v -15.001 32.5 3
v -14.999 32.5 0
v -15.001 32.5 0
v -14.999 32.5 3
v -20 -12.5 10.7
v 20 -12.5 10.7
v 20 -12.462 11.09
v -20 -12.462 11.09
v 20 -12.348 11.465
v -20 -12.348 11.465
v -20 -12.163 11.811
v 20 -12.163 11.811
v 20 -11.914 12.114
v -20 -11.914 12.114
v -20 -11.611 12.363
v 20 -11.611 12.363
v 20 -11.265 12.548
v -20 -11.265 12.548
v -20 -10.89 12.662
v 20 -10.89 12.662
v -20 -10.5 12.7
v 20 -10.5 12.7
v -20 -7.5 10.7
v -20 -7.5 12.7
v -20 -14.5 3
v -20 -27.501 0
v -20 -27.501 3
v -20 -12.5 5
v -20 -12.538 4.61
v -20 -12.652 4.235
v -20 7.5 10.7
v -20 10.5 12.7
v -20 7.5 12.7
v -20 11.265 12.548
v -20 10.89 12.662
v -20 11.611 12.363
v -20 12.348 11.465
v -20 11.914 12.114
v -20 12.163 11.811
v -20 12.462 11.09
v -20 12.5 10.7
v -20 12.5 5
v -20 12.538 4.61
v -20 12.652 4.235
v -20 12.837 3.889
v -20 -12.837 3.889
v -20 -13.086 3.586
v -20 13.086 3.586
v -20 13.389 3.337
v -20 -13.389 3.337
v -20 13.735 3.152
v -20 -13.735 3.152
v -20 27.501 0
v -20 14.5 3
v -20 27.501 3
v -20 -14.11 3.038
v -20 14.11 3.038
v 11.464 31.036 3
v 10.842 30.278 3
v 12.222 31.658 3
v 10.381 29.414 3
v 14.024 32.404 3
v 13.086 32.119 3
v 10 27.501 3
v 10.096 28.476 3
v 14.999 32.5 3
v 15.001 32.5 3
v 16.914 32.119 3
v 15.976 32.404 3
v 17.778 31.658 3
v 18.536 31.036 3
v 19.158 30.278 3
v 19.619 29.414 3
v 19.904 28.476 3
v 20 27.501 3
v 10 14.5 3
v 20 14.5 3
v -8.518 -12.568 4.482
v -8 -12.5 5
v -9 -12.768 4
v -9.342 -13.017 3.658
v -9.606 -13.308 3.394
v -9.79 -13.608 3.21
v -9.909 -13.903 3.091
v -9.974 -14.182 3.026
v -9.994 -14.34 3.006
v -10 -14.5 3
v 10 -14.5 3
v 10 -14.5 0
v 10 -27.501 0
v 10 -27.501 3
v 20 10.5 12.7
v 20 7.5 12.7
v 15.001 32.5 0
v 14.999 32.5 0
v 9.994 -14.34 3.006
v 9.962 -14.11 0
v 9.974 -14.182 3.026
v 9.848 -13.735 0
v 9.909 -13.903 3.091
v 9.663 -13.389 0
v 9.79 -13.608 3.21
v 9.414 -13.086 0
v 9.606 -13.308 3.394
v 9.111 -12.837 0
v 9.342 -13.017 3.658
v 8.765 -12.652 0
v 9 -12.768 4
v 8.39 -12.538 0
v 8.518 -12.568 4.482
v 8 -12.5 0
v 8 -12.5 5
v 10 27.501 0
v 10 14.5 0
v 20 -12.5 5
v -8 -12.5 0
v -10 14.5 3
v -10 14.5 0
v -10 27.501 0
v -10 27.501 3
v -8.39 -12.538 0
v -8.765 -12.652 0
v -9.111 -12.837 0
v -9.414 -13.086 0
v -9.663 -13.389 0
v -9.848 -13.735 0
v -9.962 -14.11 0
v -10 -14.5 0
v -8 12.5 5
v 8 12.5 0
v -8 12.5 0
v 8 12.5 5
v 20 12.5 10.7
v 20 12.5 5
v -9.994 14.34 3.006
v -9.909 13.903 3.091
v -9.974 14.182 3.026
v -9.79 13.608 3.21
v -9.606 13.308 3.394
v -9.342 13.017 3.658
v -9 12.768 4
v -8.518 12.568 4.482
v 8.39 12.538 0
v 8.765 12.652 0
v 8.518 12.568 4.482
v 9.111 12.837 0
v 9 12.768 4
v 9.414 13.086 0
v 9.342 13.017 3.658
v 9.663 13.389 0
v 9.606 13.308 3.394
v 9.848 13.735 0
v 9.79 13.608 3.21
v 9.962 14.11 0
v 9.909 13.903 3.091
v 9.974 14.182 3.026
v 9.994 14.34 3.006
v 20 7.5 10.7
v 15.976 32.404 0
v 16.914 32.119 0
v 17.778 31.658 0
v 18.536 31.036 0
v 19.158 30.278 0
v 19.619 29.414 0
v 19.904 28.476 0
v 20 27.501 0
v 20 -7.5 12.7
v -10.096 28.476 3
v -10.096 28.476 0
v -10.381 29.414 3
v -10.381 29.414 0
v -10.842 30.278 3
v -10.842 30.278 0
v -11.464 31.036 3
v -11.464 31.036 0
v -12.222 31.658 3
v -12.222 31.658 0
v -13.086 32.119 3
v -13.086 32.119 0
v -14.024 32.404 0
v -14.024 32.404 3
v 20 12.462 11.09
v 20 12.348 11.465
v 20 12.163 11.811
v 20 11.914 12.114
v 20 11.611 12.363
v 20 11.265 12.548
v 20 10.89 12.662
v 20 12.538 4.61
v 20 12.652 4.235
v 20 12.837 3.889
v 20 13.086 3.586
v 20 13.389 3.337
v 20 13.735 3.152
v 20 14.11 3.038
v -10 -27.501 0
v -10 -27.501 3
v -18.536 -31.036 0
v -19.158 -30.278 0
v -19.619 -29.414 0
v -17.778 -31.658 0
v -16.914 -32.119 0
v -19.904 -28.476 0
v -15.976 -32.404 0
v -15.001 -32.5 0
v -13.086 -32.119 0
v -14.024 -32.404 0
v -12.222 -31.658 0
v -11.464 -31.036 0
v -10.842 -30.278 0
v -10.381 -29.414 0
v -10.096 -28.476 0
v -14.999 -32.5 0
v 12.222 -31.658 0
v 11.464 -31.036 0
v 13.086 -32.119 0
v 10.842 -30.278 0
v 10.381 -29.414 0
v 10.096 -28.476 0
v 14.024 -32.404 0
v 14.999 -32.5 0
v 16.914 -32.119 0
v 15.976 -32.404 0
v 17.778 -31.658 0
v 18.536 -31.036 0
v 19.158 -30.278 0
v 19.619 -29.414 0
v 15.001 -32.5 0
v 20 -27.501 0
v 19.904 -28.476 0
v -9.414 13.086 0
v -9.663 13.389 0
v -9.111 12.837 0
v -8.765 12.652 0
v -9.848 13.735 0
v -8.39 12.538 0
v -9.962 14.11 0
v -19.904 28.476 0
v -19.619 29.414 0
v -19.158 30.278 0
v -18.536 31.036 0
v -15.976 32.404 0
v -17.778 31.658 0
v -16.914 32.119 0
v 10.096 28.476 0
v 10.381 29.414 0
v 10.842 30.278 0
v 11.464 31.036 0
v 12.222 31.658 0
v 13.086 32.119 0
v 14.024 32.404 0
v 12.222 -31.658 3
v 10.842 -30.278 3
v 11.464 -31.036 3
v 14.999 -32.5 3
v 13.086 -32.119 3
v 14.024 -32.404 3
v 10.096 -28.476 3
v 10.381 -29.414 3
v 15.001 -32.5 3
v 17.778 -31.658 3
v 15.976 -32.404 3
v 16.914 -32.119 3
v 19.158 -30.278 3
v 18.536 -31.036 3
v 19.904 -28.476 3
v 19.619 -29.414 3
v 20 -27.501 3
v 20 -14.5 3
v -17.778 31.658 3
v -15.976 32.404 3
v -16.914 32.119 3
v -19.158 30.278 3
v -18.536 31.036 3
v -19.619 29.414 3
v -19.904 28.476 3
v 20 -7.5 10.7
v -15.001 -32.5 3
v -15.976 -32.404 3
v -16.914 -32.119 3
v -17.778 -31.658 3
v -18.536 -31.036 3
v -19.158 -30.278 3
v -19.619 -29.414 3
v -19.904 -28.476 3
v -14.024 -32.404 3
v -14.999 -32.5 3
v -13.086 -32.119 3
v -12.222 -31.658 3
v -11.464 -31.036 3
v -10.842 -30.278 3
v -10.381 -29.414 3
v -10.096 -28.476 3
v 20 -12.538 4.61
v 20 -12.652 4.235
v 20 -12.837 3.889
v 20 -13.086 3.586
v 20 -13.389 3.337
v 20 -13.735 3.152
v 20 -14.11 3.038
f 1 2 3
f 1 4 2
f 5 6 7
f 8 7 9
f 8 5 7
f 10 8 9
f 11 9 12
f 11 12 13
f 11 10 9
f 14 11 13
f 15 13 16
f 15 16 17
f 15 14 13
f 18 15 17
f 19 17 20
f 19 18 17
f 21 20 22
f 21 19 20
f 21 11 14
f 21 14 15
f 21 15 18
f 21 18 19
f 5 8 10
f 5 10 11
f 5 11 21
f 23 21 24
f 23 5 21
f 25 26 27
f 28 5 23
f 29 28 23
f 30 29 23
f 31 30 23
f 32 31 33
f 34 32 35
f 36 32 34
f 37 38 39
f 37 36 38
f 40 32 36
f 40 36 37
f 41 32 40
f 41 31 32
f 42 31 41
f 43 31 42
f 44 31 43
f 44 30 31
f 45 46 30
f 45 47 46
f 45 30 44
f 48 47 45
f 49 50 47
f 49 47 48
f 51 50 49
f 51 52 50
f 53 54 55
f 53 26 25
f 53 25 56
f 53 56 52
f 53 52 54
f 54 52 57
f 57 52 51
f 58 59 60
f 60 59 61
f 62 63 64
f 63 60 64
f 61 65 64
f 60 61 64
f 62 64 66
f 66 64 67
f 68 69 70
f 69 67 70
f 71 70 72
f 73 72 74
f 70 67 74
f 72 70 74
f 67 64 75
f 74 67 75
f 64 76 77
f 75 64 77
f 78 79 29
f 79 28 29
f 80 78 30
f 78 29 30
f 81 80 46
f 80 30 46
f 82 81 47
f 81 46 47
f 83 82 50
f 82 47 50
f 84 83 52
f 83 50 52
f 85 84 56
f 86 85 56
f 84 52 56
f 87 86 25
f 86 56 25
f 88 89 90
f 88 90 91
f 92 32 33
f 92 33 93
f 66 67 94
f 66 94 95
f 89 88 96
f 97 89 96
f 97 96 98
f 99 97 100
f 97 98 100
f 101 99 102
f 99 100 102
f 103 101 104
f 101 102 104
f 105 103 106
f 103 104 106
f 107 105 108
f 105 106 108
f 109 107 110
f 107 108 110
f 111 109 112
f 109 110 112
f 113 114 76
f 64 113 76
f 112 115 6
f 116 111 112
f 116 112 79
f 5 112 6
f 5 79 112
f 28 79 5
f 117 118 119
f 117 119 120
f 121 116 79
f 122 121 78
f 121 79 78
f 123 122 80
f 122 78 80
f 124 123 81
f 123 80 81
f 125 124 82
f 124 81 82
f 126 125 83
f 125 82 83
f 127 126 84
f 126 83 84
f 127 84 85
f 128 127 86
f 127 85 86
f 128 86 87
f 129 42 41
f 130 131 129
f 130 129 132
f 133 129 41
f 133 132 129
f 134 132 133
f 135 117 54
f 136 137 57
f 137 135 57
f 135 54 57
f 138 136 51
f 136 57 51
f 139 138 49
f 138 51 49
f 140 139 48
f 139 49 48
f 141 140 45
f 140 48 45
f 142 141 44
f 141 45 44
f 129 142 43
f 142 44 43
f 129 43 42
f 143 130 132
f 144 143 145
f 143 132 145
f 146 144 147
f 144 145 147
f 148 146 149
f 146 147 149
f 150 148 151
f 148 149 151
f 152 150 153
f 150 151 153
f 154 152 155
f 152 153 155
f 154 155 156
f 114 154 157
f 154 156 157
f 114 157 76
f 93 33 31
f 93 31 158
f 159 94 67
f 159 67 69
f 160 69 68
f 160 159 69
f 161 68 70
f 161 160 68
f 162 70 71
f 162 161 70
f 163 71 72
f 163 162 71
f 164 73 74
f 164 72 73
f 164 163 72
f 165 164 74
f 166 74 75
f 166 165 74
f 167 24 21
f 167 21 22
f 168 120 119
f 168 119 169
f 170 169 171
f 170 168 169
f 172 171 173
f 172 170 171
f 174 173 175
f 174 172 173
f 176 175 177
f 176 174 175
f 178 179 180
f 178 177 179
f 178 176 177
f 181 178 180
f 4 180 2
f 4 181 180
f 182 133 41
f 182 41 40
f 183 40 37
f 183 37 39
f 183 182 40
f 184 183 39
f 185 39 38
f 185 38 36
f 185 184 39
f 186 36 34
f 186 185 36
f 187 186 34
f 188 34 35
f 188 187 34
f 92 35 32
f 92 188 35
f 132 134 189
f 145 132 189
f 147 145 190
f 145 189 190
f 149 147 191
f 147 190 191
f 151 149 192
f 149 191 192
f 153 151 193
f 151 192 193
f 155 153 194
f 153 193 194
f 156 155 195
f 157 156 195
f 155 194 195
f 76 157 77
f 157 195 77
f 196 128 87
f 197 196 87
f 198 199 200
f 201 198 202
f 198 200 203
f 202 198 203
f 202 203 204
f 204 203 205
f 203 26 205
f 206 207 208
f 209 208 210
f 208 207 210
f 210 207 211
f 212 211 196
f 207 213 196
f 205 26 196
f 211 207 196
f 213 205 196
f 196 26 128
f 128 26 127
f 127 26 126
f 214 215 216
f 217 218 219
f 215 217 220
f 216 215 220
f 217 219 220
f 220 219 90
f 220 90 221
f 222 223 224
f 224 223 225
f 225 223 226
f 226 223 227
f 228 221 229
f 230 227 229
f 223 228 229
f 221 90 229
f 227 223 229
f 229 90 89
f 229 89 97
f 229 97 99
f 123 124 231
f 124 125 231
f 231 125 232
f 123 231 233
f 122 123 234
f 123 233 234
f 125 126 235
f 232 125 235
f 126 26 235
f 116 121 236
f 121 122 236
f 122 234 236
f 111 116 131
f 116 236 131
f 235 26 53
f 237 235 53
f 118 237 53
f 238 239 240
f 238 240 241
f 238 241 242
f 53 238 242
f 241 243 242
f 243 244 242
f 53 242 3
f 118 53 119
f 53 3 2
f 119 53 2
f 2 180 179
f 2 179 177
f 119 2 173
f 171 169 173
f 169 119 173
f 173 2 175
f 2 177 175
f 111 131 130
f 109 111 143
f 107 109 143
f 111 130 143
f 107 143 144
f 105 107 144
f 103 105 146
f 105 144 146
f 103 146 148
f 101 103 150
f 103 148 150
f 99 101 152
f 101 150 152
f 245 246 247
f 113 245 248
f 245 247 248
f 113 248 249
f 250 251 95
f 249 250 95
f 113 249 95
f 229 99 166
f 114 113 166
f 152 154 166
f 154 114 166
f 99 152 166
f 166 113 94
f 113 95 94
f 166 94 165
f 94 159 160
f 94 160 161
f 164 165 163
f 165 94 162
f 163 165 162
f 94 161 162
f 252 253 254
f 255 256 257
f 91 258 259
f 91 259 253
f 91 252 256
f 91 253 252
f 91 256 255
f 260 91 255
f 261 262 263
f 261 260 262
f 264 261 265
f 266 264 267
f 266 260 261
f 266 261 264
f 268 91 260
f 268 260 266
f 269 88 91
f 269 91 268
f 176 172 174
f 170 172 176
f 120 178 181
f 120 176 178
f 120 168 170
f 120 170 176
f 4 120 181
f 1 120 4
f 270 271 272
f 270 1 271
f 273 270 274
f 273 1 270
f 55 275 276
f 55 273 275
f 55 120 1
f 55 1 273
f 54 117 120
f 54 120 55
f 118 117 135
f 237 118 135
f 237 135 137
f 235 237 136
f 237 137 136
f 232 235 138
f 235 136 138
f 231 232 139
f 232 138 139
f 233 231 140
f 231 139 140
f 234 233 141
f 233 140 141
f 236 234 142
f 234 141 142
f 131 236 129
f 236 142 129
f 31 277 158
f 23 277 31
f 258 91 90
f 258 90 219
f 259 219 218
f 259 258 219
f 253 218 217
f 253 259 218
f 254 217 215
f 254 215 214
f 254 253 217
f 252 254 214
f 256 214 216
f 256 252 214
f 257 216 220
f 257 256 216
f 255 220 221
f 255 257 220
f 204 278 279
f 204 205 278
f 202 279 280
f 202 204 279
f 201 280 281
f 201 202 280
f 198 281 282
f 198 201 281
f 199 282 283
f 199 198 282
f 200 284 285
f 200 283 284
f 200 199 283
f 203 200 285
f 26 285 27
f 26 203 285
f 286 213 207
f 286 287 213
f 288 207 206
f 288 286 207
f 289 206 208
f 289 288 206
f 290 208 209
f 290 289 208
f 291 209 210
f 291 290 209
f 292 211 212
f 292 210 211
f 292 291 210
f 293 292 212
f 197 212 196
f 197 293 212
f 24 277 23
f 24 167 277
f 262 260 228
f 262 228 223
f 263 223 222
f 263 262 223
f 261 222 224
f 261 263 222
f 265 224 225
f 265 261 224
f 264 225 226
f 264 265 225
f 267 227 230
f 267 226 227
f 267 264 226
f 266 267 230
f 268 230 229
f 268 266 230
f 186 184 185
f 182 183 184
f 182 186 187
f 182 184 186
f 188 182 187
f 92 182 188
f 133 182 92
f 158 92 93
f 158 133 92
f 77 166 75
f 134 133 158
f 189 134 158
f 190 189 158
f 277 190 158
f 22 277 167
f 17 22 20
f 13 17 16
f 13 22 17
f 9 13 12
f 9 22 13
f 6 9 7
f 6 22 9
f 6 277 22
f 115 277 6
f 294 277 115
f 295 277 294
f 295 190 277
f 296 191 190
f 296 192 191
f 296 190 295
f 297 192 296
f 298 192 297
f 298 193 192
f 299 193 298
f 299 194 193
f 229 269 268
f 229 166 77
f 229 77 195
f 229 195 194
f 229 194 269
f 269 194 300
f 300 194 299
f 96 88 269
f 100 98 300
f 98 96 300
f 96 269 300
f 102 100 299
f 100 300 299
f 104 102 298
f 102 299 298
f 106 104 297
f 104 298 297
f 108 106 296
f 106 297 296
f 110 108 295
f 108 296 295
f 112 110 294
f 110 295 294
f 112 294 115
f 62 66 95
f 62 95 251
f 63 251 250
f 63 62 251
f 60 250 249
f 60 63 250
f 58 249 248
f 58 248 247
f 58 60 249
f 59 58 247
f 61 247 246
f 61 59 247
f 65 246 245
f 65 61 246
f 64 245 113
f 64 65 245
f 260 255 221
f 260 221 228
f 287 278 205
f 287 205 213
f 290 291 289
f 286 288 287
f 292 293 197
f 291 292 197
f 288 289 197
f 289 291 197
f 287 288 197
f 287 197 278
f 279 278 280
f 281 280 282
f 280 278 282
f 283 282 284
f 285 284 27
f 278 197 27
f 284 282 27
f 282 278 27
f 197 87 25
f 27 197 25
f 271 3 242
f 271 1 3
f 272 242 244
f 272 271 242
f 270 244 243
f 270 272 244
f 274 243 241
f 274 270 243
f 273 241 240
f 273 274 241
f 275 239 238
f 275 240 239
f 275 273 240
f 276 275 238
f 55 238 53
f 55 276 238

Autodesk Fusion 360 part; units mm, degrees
sketch "Sketch1" plane through (0, 0, 0) normal (0, 0, 1) x (1, 0, 0)
  line L0 (20, -12.5) -> (-20, -12.5)
  line L1 (-20, -12.5) -> (-20, 12.5)
  line L2 (-20, 12.5) -> (20, 12.5)
  line L3 (20, 12.5) -> (20, -12.5)
  line L4 (20, -12.5) -> (-20, 12.5) construction
  line L5 (-20, -12.5) -> (20, 12.5) construction
  dimension "d1" = 40
  dimension "d2" = 25
extrude "Extrude1" add sketch "Sketch1" along normal blind 12.7
sketch "Sketch2" plane through (0, 0, 12.7) normal (0, 0, 1) x (-1, 0, 0)
  line L0 (-20, -12.5) -> (20, -12.5)
  line L1 (20, -12.5) -> (20, 12.5)
  line L2 (20, 12.5) -> (-20, 12.5)
  line L3 (-20, 12.5) -> (-20, -12.5)
  line L4 (-20, 7.5) -> (20, 7.5)
  line L5 (20, 7.5) -> (20, -7.5)
  line L6 (20, -7.5) -> (-20, -7.5)
  line L7 (-20, -7.5) -> (-20, 7.5)
  line L8 (-20, 7.5) -> (20, -7.5) construction
  line L9 (20, 7.5) -> (-20, -7.5) construction
  dimension "d5" = 40
  dimension "d6" = 15
extrude "Extrude2" cut sketch "Sketch2" against normal blind 2 contours L1 L3 L4 L5 L6 L7
sketch "Sketch3" plane through (0, -12.5, 0) normal (0, -1, 0) x (1, 0, 0)
  line L0 (-20, 0) -> (20, 0)
  line L1 (20, 0) -> (20, 12.7)
  line L2 (20, 12.7) -> (-20, 12.7)
  line L3 (-20, 12.7) -> (-20, 0)
  line L4 (0, 12.7) -> (0, 0) construction
  line L5 (20, 0) -> (10, 0)
  line L6 (10, 0) -> (10, 3)
  line L7 (10, 3) -> (20, 3)
  line L8 (20, 3) -> (20, 0)
  line L9 (-20, 0) -> (-10, 0)
  line L10 (-10, 0) -> (-10, 3)
  line L11 (-10, 3) -> (-20, 3)
  line L12 (-20, 3) -> (-20, 0)
  point P0 (0, 12.7)
  dimension "d23" = 10
  dimension "d24" = 3
  dimension "d25" = 10
  dimension "d26" = 3
extrude "Extrude5" add sketch "Sketch3" along normal blind 20 contours L0 L3 L9 L10 L11 L12 | L0 L1 L5 L6 L7 L8
sketch "Sketch6" plane through (0, 12.5, 0) normal (0, 1, 0) x (-1, 0, 0)
  line L0 (-20, 0) -> (20, 0)
  line L1 (20, 0) -> (20, 12.7)
  line L2 (20, 12.7) -> (-20, 12.7)
  line L3 (-20, 12.7) -> (-20, 0)
  line L4 (-10, 3) -> (-20, 3)
  line L5 (-10, 0) -> (-10, 3)
  line L6 (-20, 0) -> (-10, 0)
  line L7 (-20, 3) -> (-20, 0)
  line L8 (10, 0) -> (10, 3)
  line L9 (10, 3) -> (20, 3)
  line L10 (20, 0) -> (10, 0)
  line L11 (20, 3) -> (20, 0)
  line L12 (-20, 0) -> (-10, 0)
  line L13 (-10, 0) -> (-10, 3)
  line L14 (-10, 3) -> (-20, 3)
  line L15 (-20, 3) -> (-20, 0)
  line L16 (20, 0) -> (10, 0)
  line L17 (10, 0) -> (10, 3)
  line L18 (10, 3) -> (20, 3)
  line L19 (20, 3) -> (20, 0)
extrude "Extrude6" add sketch "Sketch6" along normal blind 20 contours L0 L3 L4 L5 L6 L7 L12 L13 L14 L15 | L0 L1 L8 L9 L10 L11 L16 L17 L18 L19
fillet "Fillet5" radius 2 10 edges at (-10, 12.5, 1.5) (-15, 12.5, 3) (15, 12.5, 3) (0, 12.5, 12.7) (0, -12.5, 12.7) (10, 12.5, 1.5) (-15, -12.5, 3) (10, -12.5, 1.5) (15, -12.5, 3) (-10, -12.5, 1.5)
fillet "Fillet6" radius 5 8 edges at (-20, -32.5, 1.5) (-10, -32.5, 1.5) (10, -32.5, 1.5) (20, -32.5, 1.5) (-10, 32.5, 1.5) (20, 32.5, 1.5) (-20, 32.5, 1.5) (10, 32.5, 1.5)
equation "d3 = 25.4 mm / 2"
equation "d25 = d23"
equation "d26 = d24"
